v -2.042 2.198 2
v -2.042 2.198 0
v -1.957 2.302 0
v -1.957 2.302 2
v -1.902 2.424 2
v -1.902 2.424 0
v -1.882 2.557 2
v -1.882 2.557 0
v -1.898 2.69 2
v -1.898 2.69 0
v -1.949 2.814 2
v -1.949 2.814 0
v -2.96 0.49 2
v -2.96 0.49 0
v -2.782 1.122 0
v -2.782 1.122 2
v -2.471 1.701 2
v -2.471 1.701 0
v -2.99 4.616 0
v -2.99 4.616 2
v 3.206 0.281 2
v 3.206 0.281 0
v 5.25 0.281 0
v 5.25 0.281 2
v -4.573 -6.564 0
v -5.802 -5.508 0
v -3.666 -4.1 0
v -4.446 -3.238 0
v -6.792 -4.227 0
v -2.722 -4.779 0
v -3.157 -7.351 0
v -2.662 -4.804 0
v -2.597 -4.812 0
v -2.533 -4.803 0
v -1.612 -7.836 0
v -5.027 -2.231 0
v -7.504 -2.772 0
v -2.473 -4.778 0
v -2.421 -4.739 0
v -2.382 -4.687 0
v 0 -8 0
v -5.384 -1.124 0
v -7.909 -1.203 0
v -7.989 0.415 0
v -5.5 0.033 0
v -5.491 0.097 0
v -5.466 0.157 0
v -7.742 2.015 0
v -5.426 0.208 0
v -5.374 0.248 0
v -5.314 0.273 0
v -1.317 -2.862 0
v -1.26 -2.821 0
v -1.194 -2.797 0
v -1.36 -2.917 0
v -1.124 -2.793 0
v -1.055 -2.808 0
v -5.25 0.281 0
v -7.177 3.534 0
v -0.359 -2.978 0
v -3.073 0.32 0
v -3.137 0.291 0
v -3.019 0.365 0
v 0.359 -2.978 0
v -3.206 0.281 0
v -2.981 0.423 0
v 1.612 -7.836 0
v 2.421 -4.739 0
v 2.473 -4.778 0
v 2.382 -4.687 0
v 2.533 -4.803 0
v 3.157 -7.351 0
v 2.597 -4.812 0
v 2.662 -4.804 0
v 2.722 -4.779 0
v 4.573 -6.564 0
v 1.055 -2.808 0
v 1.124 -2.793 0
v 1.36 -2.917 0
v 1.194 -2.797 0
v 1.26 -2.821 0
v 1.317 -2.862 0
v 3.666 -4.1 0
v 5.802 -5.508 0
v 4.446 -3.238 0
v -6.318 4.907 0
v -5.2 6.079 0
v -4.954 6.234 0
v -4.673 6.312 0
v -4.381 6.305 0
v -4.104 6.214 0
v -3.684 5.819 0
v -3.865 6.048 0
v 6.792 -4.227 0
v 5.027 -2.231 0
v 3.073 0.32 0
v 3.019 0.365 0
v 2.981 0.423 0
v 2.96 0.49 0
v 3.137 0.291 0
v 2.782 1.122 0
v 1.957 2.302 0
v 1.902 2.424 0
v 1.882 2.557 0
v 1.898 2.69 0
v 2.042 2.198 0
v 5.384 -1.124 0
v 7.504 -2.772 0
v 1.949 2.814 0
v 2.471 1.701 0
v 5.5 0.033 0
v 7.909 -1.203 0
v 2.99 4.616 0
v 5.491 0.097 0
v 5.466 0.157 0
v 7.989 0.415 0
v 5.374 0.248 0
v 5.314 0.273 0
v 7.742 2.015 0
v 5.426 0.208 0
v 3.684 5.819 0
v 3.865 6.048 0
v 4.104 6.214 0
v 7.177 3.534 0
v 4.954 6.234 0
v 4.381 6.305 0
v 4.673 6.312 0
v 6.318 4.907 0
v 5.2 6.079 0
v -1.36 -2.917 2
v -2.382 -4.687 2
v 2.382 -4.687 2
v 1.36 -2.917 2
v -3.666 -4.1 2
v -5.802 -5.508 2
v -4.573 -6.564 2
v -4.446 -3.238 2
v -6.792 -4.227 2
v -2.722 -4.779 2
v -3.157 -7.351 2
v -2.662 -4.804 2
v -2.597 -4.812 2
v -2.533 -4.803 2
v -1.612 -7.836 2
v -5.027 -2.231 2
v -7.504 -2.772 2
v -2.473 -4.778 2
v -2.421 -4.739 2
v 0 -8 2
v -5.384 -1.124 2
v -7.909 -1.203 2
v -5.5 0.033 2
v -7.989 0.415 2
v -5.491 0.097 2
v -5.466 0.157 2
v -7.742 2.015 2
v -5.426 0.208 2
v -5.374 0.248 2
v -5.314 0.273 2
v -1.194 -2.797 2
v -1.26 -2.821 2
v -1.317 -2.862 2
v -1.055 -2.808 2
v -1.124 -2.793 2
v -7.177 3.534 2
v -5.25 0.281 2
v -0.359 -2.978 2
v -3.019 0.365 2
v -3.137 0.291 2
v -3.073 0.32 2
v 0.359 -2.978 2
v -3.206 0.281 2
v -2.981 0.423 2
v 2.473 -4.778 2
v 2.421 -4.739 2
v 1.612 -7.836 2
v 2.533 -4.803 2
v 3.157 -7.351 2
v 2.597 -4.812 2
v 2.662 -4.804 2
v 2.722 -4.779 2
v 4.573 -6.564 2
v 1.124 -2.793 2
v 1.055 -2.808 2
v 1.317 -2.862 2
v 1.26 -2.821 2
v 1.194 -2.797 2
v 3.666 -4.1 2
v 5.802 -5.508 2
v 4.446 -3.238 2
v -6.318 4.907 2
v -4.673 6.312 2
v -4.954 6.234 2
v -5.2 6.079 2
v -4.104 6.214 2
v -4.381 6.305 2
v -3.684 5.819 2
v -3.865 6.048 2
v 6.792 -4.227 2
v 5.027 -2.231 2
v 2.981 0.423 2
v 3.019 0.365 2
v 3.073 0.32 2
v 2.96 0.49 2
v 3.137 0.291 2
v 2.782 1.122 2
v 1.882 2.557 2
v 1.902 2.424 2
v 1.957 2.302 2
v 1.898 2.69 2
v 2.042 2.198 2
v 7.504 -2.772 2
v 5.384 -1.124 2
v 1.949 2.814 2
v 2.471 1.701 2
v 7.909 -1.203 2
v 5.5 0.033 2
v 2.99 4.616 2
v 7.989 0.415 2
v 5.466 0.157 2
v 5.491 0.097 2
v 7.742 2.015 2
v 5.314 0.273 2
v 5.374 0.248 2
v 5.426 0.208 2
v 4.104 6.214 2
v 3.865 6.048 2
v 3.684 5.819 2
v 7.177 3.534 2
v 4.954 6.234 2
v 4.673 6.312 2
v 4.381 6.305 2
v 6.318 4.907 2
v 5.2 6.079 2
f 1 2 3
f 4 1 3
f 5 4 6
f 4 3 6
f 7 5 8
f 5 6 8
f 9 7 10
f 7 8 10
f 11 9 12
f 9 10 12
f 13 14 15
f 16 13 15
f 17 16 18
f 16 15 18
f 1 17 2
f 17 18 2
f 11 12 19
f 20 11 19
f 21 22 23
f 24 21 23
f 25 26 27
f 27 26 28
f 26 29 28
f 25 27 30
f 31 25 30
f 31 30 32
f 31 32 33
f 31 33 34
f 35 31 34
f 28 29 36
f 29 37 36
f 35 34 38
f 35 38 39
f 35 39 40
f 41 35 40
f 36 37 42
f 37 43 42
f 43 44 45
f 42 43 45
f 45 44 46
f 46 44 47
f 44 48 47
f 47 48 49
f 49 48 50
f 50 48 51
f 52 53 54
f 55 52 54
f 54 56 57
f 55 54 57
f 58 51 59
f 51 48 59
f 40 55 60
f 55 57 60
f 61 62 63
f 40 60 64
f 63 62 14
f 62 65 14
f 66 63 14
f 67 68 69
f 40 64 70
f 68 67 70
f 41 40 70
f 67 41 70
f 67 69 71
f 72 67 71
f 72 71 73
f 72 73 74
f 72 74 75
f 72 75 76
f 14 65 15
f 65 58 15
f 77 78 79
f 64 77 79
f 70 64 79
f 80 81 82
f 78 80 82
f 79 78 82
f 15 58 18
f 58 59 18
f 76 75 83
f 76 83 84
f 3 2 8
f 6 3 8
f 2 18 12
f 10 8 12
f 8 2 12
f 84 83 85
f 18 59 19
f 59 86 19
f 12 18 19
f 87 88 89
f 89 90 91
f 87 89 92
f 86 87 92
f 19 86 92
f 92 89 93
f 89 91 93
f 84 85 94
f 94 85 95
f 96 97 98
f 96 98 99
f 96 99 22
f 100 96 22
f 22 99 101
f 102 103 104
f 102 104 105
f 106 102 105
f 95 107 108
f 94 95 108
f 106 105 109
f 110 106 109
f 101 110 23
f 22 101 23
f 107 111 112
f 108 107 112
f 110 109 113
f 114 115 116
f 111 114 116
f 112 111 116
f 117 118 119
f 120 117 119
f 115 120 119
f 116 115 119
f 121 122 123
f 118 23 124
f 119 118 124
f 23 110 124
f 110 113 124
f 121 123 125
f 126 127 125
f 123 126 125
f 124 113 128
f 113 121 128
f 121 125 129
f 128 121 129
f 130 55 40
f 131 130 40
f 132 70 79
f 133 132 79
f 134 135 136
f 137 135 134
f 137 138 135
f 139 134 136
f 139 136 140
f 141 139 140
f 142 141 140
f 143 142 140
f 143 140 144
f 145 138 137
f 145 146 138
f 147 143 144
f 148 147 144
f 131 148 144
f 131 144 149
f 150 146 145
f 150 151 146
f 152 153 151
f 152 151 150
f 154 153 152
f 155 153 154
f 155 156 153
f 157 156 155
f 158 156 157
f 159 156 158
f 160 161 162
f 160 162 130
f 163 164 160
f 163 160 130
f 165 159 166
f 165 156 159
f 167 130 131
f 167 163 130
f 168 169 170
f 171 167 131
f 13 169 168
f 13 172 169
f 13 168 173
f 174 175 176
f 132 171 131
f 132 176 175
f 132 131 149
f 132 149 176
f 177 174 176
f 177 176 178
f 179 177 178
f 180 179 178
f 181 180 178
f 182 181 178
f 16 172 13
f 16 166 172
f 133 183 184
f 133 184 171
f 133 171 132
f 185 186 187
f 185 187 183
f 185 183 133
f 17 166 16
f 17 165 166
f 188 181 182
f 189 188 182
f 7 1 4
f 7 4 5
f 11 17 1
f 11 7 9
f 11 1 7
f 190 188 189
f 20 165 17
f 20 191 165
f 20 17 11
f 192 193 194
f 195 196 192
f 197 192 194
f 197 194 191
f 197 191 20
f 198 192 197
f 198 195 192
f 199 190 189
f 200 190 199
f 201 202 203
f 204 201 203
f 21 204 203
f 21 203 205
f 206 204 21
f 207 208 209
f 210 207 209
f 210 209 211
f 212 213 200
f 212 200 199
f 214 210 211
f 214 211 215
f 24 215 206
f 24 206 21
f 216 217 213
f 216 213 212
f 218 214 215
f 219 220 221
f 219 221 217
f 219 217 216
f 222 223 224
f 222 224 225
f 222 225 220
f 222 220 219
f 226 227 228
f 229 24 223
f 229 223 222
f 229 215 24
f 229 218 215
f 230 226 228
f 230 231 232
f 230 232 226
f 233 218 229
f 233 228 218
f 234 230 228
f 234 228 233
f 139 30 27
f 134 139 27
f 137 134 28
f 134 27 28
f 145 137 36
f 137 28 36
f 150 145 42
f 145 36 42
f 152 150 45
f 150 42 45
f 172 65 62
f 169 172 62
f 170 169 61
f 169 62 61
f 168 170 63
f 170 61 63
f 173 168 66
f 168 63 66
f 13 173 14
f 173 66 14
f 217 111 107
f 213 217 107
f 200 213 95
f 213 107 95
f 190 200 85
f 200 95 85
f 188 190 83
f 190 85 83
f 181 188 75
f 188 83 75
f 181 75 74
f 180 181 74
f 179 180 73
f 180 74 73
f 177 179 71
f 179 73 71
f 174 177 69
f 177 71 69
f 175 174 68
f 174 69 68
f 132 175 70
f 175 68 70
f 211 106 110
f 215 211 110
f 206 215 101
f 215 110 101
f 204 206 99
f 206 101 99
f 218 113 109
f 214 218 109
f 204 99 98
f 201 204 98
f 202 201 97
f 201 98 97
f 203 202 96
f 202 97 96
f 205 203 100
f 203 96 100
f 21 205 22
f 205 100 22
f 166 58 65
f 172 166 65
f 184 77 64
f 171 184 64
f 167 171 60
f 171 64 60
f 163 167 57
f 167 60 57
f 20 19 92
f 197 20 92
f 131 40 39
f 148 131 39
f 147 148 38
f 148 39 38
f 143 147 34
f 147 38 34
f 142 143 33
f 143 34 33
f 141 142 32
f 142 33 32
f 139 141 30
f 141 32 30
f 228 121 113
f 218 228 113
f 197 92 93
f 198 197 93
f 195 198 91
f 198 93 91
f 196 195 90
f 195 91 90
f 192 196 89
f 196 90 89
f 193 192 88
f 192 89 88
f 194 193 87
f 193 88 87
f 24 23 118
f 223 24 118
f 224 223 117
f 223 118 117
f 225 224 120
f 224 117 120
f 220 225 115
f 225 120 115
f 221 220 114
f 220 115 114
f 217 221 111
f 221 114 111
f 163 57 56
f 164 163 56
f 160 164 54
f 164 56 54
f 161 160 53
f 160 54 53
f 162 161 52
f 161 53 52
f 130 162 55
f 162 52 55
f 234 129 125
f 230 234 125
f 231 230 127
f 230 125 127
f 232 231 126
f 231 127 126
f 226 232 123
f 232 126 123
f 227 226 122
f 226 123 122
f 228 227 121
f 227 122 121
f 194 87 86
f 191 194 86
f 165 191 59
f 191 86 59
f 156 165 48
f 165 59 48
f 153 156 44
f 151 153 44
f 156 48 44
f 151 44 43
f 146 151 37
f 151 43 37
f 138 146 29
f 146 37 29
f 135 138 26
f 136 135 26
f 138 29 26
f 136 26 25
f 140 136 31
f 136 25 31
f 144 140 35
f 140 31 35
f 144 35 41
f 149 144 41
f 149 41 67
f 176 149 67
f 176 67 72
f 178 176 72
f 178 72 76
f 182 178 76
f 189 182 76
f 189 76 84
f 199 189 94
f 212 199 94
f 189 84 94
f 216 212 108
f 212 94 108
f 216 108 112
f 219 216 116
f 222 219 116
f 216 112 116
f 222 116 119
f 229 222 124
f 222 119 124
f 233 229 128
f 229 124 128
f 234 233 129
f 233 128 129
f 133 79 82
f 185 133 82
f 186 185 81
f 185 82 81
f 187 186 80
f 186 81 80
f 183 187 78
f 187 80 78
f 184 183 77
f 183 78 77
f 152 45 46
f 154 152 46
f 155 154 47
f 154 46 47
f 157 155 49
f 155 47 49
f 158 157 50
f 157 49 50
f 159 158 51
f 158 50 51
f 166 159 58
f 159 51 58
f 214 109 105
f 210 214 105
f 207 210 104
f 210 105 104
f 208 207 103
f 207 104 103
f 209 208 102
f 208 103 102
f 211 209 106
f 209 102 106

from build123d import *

# Parameters (mm, degrees)
BOSS_EXTRUDE1_DEPTH = 2


with BuildPart() as part:
    # Sketch2 → Boss-Extrude1 (new body)
    with BuildSketch(Plane.XY):
        with BuildLine():
            Line((2.381551342, -4.687082444), (1.359756513, -2.917281885))
            ThreePointArc((1.359756513, -2.917281885), (1.227533074, -2.806917507), (1.055307842, -2.808260202))
            ThreePointArc((1.055307842, -2.808260202), (0, -3), (-1.055307842, -2.808260202))
            ThreePointArc((-1.055307842, -2.808260202), (-1.227533074, -2.806917507), (-1.359756513, -2.917281885))
            Line((-1.359756513, -2.917281885), (-2.381551342, -4.687082444))
            ThreePointArc((-2.381551342, -4.687082444), (-2.532638949, -4.803371457), (-2.721774726, -4.779324465))
            ThreePointArc((-2.721774726, -4.779324465), (-4.763139721, -2.75), (-5.499903763, 0.032536177))
            ThreePointArc((-5.499903763, 0.032536177), (-5.426161181, 0.20835606), (-5.249908137, 0.28105726))
            Line((-5.249908137, 0.28105726), (-3.206318479, 0.28105726))
            ThreePointArc((-3.206318479, 0.28105726), (-3.044628404, 0.340383927), (-2.959678596, 0.490206701))
            ThreePointArc((-2.959678596, 0.490206701), (-2.64255111, 1.420184366), (-2.041957666, 2.197819122))
            ThreePointArc((-2.041957666, 2.197819122), (-1.88784416, 2.489763038), (-1.949271241, 2.814122309))
            Line((-1.949271241, 2.814122309), (-2.98980978, 4.616387925))
            Line((-2.98980978, 4.616387925), (-3.684292593, 5.819267442))
            ThreePointArc((-3.684292593, 5.819267442), (-4.381355766, 6.304889969), (-5.200363425, 6.079162791))
            ThreePointArc((-5.200363425, 6.079162791), (0, -8), (5.200363425, 6.079162791))
            ThreePointArc((5.200363425, 6.079162791), (4.381355766, 6.304889969), (3.684292593, 5.819267442))
            Line((3.684292593, 5.819267442), (2.98980978, 4.616387925))
            Line((2.98980978, 4.616387925), (1.949271241, 2.814122309))
            ThreePointArc((1.949271241, 2.814122309), (1.88784416, 2.489763038), (2.041957666, 2.197819122))
            ThreePointArc((2.041957666, 2.197819122), (2.64255111, 1.420184366), (2.959678596, 0.490206701))
            ThreePointArc((2.959678596, 0.490206701), (3.044628404, 0.340383927), (3.206318479, 0.28105726))
            Line((3.206318479, 0.28105726), (5.249908137, 0.28105726))
            ThreePointArc((5.249908137, 0.28105726), (5.426161181, 0.20835606), (5.499903763, 0.032536177))
            ThreePointArc((5.499903763, 0.032536177), (4.763139721, -2.75), (2.721774726, -4.779324465))
            ThreePointArc((2.721774726, -4.779324465), (2.532638949, -4.803371457), (2.381551342, -4.687082444))
        make_face()
    extrude(amount=BOSS_EXTRUDE1_DEPTH)


solid = part.part
